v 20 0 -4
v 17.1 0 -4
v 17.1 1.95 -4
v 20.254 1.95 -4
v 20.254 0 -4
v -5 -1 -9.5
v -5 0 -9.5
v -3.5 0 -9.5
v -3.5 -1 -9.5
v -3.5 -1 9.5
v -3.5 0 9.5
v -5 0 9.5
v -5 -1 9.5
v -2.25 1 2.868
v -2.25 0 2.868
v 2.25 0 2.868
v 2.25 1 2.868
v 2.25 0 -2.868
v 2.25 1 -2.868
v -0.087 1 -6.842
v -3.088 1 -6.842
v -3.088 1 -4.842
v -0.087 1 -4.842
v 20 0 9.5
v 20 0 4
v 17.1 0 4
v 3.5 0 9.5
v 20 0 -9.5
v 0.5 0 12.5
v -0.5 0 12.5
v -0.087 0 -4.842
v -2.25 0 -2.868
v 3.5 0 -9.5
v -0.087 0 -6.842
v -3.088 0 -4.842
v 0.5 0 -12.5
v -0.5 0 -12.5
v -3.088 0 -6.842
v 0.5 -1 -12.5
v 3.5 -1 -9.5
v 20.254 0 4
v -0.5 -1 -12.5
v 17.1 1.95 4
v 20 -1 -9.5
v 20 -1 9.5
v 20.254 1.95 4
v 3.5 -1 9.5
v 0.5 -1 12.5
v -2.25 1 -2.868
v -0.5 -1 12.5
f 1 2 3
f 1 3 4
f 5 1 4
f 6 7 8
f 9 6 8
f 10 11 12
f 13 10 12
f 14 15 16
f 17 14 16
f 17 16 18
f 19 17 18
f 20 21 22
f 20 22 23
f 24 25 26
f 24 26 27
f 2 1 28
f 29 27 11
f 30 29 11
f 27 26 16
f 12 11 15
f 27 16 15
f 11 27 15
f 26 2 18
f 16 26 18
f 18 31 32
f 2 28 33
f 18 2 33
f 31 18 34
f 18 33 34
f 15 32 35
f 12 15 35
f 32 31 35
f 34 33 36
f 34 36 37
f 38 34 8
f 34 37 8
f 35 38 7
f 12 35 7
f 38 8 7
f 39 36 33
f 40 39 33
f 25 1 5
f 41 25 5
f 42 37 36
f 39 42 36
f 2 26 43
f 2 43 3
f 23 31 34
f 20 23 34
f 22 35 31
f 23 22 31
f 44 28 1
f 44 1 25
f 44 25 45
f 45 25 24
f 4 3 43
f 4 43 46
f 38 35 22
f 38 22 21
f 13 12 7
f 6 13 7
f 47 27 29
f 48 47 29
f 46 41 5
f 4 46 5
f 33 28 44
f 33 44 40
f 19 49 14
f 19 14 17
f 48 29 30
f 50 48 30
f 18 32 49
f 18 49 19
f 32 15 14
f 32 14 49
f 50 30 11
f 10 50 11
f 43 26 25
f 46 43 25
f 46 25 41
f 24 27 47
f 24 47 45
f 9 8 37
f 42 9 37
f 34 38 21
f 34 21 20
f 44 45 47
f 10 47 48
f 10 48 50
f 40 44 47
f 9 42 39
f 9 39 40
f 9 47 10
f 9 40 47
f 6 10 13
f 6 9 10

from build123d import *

# Parameters (mm, degrees)
BOSS_EXTRUDE1_DEPTH = 1.000000032
SKETCH2_W           = 4.49999989
SKETCH2_H           = 5.735208424
SKETCH2_W_2         = 3
SKETCH2_H_2         = 2
BOSS_EXTRUDE2_DEPTH = 1
SKETCH3_W           = 3.154000042
SKETCH3_H           = 8.000000002
BOSS_EXTRUDE3_DEPTH = 1.94999991


with BuildPart() as part:
    # Sketch1 → Boss-Extrude1 (new body)
    with BuildSketch(Plane(origin=(0, 0, 0), x_dir=(1, 0, 0), z_dir=(0, 1, 0))):
        Polygon((-3.499999985, 9.50000005), (-0.499999889, 12.500000146), (0.499999889, 12.500000146), (3.499999985, 9.50000005), (4.999999906, 9.50000005), (20.000000132, 9.50000005), (20.000000132, -9.50000005), (4.999999906, -9.50000005), (3.499999985, -9.50000005), (0.499999889, -12.500000146), (-0.499999889, -12.500000146), (-3.499999985, -9.50000005), (-4.999999906, -9.50000005), (-4.999999906, 9.50000005), align=None)
    extrude(amount=-BOSS_EXTRUDE1_DEPTH)

    # Sketch2 → Boss-Extrude2 (add)
    with BuildSketch(Plane(origin=(0, 0, 0), x_dir=(1, 0, 0), z_dir=(0, 1, 0))):
        Rectangle(SKETCH2_W, SKETCH2_H)
        with Locations((-1.5875, 5.842)):
            Rectangle(SKETCH2_W_2, SKETCH2_H_2)
    extrude(amount=BOSS_EXTRUDE2_DEPTH)

    # Sketch3 → Boss-Extrude3 (add)
    with BuildSketch(Plane(origin=(0, 0, 0), x_dir=(1, 0, 0), z_dir=(0, 1, 0))):
        with Locations((18.677000111, 0)):
            Rectangle(SKETCH3_W, SKETCH3_H)
    extrude(amount=BOSS_EXTRUDE3_DEPTH)


solid = part.part
